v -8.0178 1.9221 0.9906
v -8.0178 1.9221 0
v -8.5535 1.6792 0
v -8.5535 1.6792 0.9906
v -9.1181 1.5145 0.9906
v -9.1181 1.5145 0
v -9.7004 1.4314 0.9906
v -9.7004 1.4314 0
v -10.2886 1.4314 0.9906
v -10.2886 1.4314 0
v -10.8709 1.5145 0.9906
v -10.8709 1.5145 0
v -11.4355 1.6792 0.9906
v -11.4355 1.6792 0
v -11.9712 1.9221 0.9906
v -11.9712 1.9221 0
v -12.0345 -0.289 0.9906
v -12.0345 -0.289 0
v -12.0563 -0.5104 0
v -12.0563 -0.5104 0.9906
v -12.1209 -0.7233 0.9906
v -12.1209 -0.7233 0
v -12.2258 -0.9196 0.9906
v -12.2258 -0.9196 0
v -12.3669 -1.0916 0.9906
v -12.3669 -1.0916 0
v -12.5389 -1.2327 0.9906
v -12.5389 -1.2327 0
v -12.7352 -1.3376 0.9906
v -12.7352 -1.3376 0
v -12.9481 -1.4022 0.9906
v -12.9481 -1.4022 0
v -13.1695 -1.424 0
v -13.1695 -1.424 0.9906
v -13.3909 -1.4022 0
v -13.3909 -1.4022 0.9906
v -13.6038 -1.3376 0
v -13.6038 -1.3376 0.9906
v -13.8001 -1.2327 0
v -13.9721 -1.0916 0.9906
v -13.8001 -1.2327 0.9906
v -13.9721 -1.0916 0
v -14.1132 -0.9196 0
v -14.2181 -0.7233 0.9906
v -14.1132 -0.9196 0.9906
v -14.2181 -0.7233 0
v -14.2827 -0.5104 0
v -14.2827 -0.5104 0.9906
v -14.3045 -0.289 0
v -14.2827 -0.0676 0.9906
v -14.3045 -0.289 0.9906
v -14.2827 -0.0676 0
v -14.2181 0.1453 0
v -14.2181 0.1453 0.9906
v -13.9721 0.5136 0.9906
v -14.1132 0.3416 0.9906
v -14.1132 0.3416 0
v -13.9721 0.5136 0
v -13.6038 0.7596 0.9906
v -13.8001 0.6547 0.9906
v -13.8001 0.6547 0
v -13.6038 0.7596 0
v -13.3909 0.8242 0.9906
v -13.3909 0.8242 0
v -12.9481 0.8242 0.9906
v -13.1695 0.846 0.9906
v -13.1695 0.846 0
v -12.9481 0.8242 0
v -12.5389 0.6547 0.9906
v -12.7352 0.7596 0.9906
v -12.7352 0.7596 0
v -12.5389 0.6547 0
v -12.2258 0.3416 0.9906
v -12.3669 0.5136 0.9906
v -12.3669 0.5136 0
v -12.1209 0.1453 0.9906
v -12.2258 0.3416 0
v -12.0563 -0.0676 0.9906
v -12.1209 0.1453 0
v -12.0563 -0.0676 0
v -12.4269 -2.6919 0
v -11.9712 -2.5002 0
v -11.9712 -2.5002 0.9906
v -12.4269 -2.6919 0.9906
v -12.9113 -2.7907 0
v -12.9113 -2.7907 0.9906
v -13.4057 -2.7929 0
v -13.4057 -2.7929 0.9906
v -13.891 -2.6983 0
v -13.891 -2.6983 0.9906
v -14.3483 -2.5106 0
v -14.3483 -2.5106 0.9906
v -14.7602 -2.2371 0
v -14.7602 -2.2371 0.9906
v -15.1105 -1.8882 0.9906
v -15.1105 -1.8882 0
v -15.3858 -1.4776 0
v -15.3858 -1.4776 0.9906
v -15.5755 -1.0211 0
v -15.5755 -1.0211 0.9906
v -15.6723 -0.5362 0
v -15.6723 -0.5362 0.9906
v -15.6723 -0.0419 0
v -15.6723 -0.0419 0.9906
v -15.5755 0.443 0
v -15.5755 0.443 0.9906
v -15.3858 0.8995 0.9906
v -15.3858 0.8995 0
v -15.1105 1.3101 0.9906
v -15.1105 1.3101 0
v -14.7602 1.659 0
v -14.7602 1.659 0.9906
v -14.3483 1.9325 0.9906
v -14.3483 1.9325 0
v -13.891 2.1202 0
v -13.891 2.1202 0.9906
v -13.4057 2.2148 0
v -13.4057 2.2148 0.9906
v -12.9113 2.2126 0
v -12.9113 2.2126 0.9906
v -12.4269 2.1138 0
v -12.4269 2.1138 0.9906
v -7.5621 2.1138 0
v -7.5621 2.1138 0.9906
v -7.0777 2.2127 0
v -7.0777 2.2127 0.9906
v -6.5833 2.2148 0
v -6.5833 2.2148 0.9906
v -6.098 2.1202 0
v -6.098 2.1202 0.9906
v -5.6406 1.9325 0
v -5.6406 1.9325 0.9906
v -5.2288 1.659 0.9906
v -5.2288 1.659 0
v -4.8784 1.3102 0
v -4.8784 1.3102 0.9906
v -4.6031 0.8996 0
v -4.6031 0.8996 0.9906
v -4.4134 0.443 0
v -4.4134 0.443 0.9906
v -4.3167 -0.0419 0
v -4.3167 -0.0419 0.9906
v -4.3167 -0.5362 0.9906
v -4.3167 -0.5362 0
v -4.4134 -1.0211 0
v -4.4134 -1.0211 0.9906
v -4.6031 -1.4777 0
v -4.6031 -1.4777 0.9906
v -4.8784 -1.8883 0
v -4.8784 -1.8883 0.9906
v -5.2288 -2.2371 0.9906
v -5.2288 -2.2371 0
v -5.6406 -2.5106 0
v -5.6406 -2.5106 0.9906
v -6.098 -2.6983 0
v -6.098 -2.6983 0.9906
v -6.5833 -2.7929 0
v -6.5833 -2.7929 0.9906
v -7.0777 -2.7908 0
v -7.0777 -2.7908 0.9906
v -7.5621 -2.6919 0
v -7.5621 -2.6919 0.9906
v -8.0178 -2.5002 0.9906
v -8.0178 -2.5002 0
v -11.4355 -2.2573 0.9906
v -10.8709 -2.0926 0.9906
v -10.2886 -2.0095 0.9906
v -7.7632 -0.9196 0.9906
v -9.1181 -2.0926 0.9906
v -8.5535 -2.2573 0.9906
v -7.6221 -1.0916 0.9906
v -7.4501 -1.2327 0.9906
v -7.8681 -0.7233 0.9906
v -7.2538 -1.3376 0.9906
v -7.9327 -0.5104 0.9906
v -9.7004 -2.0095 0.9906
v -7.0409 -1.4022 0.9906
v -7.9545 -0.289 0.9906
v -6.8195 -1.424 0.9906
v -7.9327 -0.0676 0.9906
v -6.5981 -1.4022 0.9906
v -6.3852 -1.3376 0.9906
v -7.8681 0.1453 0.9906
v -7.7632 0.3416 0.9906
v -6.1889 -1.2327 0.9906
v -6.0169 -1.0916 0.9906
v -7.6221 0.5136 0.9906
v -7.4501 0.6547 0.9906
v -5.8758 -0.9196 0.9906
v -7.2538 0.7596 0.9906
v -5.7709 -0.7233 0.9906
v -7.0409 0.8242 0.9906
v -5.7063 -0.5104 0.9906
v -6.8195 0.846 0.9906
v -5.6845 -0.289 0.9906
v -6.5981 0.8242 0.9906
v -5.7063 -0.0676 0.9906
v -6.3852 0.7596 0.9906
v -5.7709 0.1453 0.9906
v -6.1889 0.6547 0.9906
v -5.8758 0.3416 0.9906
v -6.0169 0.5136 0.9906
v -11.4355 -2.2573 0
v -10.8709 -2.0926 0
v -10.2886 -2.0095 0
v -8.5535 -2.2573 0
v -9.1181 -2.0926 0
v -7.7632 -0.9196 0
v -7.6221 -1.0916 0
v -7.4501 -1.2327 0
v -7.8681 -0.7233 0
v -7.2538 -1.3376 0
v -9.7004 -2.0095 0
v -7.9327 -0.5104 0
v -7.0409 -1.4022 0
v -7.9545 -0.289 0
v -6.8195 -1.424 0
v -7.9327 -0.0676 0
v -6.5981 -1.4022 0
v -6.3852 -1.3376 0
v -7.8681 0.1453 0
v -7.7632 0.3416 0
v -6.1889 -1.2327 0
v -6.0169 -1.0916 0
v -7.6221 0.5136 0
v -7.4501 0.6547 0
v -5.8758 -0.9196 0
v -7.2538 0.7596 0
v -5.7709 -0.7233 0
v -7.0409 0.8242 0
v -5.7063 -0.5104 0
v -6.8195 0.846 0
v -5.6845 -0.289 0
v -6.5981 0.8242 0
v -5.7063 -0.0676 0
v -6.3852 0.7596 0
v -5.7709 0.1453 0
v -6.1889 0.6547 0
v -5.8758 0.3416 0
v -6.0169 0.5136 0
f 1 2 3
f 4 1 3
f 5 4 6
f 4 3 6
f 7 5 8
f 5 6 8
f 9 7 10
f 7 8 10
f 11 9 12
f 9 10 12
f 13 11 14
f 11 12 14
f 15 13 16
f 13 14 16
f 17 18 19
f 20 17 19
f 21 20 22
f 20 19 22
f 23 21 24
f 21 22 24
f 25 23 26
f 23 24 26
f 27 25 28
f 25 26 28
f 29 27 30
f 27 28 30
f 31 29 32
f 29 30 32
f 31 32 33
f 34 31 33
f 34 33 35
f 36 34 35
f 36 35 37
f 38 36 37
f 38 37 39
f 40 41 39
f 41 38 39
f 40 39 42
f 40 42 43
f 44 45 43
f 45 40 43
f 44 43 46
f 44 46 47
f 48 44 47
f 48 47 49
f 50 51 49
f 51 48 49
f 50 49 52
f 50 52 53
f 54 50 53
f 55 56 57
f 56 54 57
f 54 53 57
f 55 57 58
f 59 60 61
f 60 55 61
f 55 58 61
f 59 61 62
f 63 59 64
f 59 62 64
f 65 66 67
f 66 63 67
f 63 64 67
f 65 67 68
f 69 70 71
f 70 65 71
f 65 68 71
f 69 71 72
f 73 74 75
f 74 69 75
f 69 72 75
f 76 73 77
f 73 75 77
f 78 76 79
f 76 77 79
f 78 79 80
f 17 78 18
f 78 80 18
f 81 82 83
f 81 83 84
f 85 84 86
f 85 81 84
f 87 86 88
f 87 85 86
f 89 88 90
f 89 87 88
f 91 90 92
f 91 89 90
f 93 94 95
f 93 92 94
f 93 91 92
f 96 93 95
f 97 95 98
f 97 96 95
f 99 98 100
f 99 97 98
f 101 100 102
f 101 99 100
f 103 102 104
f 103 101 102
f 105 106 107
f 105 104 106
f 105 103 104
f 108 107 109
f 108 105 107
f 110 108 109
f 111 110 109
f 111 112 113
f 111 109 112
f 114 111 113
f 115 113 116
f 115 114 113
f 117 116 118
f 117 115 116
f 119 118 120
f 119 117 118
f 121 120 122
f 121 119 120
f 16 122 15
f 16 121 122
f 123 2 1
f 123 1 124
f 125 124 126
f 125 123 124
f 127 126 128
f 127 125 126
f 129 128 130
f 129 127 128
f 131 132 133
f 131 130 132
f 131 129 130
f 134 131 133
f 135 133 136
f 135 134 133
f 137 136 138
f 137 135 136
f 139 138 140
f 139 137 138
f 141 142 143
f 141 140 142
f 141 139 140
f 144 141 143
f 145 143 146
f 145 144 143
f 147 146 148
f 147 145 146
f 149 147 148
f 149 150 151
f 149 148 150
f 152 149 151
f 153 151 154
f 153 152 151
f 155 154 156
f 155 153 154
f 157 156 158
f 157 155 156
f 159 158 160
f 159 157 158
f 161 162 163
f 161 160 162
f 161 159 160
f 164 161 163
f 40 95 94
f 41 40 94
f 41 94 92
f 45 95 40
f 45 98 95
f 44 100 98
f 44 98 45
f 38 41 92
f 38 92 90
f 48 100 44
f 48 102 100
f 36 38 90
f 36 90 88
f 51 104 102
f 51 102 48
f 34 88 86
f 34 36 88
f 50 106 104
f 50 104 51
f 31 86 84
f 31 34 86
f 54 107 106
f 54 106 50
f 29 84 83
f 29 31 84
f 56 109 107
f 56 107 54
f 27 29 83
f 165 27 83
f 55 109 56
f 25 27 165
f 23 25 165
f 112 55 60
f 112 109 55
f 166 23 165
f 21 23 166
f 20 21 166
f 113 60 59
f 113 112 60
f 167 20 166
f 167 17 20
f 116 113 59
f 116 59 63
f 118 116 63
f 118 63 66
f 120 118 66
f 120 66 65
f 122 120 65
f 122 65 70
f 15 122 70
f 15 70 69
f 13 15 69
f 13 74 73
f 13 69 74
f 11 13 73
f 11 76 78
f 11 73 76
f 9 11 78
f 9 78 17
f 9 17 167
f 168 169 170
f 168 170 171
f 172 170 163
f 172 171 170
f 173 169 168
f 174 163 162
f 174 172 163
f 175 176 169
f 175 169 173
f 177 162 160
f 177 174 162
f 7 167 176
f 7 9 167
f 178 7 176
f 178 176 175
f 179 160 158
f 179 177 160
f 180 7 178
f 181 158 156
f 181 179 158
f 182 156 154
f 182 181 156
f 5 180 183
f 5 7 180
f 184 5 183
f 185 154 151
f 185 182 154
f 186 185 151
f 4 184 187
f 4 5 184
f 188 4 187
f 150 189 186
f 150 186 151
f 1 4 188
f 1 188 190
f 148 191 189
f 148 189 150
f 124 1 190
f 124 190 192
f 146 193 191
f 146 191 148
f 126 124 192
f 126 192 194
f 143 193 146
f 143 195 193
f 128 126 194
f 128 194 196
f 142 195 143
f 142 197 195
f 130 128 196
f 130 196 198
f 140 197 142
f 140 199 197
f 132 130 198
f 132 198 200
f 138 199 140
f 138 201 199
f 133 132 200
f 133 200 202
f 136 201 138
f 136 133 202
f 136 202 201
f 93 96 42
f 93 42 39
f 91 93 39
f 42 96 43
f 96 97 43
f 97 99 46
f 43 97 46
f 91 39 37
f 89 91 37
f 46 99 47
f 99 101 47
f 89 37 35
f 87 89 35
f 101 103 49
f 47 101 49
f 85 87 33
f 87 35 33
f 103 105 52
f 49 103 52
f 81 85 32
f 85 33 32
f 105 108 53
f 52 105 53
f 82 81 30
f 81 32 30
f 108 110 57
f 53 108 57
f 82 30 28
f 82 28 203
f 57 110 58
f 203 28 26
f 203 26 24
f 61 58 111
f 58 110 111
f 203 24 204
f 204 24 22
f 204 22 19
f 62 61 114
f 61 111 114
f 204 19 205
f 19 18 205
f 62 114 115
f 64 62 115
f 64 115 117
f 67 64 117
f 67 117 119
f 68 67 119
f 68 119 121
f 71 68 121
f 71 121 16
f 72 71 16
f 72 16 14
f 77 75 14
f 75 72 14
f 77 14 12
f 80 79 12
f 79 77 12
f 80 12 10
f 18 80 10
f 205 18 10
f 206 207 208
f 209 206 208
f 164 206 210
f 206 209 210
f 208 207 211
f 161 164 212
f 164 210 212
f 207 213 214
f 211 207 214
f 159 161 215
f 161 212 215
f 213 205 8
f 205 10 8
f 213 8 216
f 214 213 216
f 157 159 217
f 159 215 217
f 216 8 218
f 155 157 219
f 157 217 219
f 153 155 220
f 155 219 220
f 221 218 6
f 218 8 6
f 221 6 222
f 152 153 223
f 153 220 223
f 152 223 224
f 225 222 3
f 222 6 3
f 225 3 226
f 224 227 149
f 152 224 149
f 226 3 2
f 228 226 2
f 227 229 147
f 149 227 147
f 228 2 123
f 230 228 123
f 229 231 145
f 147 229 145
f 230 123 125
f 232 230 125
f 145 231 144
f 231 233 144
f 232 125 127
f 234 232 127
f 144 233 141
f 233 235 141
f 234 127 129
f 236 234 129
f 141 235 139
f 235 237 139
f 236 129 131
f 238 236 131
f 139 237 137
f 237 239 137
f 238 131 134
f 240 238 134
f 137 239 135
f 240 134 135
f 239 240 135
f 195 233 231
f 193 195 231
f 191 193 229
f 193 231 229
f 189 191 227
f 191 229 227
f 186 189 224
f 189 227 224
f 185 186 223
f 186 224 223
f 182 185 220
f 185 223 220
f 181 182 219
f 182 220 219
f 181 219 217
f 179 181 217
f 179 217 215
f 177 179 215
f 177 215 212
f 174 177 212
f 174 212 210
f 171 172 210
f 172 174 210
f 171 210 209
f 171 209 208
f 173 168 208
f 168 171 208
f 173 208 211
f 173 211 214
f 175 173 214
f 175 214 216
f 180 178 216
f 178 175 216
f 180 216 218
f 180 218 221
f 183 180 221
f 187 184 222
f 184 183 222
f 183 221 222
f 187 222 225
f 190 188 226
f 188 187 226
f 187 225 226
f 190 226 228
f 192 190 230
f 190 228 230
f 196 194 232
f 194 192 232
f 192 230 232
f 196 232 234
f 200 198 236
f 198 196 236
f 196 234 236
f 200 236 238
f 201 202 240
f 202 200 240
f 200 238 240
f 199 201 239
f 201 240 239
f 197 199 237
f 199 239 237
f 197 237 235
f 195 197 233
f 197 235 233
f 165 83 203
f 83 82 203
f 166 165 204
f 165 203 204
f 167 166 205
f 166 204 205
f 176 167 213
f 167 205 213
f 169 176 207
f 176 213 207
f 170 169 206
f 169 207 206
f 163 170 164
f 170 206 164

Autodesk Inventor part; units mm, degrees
ref_plane "YZ Plane" through (0, 0, 0) normal (1, 0, 0) x (0, 1, 0)
ref_plane "XZ Plane" through (0, 0, 0) normal (0, 1, 0) x (-1, 0, 0)
ref_plane "XY Plane" through (0, 0, 0) normal (0, 0, 1) x (1, 0, 0)
sketch "Sketch1" plane through (0, 0, 0) normal (0, 0, 1) x (1, 0, 0)
  arc A0 (-11.9712, 1.9221) -> (-8.0178, 1.9221) centre (-9.9945, 5.5697) ccw projected
  arc A1 (-8.0178, -2.5002) -> (-8.0178, 1.9221) centre (-6.8195, -0.289) ccw projected
  arc A2 (-8.0178, -2.5002) -> (-11.9712, -2.5002) centre (-9.9945, -6.1478) ccw projected
  arc A3 (-11.9712, 1.9221) -> (-11.9712, -2.5002) centre (-13.1695, -0.289) ccw projected
  circle A4 centre (-13.1695, -0.289) radius 1.135 projected
  circle A5 centre (-6.8195, -0.289) radius 1.135 projected
  point P0 (0, 0)
extrude "Extrusion1" add sketch "Sketch1" along normal blind 0.9906
properties part number "Chain Link"
